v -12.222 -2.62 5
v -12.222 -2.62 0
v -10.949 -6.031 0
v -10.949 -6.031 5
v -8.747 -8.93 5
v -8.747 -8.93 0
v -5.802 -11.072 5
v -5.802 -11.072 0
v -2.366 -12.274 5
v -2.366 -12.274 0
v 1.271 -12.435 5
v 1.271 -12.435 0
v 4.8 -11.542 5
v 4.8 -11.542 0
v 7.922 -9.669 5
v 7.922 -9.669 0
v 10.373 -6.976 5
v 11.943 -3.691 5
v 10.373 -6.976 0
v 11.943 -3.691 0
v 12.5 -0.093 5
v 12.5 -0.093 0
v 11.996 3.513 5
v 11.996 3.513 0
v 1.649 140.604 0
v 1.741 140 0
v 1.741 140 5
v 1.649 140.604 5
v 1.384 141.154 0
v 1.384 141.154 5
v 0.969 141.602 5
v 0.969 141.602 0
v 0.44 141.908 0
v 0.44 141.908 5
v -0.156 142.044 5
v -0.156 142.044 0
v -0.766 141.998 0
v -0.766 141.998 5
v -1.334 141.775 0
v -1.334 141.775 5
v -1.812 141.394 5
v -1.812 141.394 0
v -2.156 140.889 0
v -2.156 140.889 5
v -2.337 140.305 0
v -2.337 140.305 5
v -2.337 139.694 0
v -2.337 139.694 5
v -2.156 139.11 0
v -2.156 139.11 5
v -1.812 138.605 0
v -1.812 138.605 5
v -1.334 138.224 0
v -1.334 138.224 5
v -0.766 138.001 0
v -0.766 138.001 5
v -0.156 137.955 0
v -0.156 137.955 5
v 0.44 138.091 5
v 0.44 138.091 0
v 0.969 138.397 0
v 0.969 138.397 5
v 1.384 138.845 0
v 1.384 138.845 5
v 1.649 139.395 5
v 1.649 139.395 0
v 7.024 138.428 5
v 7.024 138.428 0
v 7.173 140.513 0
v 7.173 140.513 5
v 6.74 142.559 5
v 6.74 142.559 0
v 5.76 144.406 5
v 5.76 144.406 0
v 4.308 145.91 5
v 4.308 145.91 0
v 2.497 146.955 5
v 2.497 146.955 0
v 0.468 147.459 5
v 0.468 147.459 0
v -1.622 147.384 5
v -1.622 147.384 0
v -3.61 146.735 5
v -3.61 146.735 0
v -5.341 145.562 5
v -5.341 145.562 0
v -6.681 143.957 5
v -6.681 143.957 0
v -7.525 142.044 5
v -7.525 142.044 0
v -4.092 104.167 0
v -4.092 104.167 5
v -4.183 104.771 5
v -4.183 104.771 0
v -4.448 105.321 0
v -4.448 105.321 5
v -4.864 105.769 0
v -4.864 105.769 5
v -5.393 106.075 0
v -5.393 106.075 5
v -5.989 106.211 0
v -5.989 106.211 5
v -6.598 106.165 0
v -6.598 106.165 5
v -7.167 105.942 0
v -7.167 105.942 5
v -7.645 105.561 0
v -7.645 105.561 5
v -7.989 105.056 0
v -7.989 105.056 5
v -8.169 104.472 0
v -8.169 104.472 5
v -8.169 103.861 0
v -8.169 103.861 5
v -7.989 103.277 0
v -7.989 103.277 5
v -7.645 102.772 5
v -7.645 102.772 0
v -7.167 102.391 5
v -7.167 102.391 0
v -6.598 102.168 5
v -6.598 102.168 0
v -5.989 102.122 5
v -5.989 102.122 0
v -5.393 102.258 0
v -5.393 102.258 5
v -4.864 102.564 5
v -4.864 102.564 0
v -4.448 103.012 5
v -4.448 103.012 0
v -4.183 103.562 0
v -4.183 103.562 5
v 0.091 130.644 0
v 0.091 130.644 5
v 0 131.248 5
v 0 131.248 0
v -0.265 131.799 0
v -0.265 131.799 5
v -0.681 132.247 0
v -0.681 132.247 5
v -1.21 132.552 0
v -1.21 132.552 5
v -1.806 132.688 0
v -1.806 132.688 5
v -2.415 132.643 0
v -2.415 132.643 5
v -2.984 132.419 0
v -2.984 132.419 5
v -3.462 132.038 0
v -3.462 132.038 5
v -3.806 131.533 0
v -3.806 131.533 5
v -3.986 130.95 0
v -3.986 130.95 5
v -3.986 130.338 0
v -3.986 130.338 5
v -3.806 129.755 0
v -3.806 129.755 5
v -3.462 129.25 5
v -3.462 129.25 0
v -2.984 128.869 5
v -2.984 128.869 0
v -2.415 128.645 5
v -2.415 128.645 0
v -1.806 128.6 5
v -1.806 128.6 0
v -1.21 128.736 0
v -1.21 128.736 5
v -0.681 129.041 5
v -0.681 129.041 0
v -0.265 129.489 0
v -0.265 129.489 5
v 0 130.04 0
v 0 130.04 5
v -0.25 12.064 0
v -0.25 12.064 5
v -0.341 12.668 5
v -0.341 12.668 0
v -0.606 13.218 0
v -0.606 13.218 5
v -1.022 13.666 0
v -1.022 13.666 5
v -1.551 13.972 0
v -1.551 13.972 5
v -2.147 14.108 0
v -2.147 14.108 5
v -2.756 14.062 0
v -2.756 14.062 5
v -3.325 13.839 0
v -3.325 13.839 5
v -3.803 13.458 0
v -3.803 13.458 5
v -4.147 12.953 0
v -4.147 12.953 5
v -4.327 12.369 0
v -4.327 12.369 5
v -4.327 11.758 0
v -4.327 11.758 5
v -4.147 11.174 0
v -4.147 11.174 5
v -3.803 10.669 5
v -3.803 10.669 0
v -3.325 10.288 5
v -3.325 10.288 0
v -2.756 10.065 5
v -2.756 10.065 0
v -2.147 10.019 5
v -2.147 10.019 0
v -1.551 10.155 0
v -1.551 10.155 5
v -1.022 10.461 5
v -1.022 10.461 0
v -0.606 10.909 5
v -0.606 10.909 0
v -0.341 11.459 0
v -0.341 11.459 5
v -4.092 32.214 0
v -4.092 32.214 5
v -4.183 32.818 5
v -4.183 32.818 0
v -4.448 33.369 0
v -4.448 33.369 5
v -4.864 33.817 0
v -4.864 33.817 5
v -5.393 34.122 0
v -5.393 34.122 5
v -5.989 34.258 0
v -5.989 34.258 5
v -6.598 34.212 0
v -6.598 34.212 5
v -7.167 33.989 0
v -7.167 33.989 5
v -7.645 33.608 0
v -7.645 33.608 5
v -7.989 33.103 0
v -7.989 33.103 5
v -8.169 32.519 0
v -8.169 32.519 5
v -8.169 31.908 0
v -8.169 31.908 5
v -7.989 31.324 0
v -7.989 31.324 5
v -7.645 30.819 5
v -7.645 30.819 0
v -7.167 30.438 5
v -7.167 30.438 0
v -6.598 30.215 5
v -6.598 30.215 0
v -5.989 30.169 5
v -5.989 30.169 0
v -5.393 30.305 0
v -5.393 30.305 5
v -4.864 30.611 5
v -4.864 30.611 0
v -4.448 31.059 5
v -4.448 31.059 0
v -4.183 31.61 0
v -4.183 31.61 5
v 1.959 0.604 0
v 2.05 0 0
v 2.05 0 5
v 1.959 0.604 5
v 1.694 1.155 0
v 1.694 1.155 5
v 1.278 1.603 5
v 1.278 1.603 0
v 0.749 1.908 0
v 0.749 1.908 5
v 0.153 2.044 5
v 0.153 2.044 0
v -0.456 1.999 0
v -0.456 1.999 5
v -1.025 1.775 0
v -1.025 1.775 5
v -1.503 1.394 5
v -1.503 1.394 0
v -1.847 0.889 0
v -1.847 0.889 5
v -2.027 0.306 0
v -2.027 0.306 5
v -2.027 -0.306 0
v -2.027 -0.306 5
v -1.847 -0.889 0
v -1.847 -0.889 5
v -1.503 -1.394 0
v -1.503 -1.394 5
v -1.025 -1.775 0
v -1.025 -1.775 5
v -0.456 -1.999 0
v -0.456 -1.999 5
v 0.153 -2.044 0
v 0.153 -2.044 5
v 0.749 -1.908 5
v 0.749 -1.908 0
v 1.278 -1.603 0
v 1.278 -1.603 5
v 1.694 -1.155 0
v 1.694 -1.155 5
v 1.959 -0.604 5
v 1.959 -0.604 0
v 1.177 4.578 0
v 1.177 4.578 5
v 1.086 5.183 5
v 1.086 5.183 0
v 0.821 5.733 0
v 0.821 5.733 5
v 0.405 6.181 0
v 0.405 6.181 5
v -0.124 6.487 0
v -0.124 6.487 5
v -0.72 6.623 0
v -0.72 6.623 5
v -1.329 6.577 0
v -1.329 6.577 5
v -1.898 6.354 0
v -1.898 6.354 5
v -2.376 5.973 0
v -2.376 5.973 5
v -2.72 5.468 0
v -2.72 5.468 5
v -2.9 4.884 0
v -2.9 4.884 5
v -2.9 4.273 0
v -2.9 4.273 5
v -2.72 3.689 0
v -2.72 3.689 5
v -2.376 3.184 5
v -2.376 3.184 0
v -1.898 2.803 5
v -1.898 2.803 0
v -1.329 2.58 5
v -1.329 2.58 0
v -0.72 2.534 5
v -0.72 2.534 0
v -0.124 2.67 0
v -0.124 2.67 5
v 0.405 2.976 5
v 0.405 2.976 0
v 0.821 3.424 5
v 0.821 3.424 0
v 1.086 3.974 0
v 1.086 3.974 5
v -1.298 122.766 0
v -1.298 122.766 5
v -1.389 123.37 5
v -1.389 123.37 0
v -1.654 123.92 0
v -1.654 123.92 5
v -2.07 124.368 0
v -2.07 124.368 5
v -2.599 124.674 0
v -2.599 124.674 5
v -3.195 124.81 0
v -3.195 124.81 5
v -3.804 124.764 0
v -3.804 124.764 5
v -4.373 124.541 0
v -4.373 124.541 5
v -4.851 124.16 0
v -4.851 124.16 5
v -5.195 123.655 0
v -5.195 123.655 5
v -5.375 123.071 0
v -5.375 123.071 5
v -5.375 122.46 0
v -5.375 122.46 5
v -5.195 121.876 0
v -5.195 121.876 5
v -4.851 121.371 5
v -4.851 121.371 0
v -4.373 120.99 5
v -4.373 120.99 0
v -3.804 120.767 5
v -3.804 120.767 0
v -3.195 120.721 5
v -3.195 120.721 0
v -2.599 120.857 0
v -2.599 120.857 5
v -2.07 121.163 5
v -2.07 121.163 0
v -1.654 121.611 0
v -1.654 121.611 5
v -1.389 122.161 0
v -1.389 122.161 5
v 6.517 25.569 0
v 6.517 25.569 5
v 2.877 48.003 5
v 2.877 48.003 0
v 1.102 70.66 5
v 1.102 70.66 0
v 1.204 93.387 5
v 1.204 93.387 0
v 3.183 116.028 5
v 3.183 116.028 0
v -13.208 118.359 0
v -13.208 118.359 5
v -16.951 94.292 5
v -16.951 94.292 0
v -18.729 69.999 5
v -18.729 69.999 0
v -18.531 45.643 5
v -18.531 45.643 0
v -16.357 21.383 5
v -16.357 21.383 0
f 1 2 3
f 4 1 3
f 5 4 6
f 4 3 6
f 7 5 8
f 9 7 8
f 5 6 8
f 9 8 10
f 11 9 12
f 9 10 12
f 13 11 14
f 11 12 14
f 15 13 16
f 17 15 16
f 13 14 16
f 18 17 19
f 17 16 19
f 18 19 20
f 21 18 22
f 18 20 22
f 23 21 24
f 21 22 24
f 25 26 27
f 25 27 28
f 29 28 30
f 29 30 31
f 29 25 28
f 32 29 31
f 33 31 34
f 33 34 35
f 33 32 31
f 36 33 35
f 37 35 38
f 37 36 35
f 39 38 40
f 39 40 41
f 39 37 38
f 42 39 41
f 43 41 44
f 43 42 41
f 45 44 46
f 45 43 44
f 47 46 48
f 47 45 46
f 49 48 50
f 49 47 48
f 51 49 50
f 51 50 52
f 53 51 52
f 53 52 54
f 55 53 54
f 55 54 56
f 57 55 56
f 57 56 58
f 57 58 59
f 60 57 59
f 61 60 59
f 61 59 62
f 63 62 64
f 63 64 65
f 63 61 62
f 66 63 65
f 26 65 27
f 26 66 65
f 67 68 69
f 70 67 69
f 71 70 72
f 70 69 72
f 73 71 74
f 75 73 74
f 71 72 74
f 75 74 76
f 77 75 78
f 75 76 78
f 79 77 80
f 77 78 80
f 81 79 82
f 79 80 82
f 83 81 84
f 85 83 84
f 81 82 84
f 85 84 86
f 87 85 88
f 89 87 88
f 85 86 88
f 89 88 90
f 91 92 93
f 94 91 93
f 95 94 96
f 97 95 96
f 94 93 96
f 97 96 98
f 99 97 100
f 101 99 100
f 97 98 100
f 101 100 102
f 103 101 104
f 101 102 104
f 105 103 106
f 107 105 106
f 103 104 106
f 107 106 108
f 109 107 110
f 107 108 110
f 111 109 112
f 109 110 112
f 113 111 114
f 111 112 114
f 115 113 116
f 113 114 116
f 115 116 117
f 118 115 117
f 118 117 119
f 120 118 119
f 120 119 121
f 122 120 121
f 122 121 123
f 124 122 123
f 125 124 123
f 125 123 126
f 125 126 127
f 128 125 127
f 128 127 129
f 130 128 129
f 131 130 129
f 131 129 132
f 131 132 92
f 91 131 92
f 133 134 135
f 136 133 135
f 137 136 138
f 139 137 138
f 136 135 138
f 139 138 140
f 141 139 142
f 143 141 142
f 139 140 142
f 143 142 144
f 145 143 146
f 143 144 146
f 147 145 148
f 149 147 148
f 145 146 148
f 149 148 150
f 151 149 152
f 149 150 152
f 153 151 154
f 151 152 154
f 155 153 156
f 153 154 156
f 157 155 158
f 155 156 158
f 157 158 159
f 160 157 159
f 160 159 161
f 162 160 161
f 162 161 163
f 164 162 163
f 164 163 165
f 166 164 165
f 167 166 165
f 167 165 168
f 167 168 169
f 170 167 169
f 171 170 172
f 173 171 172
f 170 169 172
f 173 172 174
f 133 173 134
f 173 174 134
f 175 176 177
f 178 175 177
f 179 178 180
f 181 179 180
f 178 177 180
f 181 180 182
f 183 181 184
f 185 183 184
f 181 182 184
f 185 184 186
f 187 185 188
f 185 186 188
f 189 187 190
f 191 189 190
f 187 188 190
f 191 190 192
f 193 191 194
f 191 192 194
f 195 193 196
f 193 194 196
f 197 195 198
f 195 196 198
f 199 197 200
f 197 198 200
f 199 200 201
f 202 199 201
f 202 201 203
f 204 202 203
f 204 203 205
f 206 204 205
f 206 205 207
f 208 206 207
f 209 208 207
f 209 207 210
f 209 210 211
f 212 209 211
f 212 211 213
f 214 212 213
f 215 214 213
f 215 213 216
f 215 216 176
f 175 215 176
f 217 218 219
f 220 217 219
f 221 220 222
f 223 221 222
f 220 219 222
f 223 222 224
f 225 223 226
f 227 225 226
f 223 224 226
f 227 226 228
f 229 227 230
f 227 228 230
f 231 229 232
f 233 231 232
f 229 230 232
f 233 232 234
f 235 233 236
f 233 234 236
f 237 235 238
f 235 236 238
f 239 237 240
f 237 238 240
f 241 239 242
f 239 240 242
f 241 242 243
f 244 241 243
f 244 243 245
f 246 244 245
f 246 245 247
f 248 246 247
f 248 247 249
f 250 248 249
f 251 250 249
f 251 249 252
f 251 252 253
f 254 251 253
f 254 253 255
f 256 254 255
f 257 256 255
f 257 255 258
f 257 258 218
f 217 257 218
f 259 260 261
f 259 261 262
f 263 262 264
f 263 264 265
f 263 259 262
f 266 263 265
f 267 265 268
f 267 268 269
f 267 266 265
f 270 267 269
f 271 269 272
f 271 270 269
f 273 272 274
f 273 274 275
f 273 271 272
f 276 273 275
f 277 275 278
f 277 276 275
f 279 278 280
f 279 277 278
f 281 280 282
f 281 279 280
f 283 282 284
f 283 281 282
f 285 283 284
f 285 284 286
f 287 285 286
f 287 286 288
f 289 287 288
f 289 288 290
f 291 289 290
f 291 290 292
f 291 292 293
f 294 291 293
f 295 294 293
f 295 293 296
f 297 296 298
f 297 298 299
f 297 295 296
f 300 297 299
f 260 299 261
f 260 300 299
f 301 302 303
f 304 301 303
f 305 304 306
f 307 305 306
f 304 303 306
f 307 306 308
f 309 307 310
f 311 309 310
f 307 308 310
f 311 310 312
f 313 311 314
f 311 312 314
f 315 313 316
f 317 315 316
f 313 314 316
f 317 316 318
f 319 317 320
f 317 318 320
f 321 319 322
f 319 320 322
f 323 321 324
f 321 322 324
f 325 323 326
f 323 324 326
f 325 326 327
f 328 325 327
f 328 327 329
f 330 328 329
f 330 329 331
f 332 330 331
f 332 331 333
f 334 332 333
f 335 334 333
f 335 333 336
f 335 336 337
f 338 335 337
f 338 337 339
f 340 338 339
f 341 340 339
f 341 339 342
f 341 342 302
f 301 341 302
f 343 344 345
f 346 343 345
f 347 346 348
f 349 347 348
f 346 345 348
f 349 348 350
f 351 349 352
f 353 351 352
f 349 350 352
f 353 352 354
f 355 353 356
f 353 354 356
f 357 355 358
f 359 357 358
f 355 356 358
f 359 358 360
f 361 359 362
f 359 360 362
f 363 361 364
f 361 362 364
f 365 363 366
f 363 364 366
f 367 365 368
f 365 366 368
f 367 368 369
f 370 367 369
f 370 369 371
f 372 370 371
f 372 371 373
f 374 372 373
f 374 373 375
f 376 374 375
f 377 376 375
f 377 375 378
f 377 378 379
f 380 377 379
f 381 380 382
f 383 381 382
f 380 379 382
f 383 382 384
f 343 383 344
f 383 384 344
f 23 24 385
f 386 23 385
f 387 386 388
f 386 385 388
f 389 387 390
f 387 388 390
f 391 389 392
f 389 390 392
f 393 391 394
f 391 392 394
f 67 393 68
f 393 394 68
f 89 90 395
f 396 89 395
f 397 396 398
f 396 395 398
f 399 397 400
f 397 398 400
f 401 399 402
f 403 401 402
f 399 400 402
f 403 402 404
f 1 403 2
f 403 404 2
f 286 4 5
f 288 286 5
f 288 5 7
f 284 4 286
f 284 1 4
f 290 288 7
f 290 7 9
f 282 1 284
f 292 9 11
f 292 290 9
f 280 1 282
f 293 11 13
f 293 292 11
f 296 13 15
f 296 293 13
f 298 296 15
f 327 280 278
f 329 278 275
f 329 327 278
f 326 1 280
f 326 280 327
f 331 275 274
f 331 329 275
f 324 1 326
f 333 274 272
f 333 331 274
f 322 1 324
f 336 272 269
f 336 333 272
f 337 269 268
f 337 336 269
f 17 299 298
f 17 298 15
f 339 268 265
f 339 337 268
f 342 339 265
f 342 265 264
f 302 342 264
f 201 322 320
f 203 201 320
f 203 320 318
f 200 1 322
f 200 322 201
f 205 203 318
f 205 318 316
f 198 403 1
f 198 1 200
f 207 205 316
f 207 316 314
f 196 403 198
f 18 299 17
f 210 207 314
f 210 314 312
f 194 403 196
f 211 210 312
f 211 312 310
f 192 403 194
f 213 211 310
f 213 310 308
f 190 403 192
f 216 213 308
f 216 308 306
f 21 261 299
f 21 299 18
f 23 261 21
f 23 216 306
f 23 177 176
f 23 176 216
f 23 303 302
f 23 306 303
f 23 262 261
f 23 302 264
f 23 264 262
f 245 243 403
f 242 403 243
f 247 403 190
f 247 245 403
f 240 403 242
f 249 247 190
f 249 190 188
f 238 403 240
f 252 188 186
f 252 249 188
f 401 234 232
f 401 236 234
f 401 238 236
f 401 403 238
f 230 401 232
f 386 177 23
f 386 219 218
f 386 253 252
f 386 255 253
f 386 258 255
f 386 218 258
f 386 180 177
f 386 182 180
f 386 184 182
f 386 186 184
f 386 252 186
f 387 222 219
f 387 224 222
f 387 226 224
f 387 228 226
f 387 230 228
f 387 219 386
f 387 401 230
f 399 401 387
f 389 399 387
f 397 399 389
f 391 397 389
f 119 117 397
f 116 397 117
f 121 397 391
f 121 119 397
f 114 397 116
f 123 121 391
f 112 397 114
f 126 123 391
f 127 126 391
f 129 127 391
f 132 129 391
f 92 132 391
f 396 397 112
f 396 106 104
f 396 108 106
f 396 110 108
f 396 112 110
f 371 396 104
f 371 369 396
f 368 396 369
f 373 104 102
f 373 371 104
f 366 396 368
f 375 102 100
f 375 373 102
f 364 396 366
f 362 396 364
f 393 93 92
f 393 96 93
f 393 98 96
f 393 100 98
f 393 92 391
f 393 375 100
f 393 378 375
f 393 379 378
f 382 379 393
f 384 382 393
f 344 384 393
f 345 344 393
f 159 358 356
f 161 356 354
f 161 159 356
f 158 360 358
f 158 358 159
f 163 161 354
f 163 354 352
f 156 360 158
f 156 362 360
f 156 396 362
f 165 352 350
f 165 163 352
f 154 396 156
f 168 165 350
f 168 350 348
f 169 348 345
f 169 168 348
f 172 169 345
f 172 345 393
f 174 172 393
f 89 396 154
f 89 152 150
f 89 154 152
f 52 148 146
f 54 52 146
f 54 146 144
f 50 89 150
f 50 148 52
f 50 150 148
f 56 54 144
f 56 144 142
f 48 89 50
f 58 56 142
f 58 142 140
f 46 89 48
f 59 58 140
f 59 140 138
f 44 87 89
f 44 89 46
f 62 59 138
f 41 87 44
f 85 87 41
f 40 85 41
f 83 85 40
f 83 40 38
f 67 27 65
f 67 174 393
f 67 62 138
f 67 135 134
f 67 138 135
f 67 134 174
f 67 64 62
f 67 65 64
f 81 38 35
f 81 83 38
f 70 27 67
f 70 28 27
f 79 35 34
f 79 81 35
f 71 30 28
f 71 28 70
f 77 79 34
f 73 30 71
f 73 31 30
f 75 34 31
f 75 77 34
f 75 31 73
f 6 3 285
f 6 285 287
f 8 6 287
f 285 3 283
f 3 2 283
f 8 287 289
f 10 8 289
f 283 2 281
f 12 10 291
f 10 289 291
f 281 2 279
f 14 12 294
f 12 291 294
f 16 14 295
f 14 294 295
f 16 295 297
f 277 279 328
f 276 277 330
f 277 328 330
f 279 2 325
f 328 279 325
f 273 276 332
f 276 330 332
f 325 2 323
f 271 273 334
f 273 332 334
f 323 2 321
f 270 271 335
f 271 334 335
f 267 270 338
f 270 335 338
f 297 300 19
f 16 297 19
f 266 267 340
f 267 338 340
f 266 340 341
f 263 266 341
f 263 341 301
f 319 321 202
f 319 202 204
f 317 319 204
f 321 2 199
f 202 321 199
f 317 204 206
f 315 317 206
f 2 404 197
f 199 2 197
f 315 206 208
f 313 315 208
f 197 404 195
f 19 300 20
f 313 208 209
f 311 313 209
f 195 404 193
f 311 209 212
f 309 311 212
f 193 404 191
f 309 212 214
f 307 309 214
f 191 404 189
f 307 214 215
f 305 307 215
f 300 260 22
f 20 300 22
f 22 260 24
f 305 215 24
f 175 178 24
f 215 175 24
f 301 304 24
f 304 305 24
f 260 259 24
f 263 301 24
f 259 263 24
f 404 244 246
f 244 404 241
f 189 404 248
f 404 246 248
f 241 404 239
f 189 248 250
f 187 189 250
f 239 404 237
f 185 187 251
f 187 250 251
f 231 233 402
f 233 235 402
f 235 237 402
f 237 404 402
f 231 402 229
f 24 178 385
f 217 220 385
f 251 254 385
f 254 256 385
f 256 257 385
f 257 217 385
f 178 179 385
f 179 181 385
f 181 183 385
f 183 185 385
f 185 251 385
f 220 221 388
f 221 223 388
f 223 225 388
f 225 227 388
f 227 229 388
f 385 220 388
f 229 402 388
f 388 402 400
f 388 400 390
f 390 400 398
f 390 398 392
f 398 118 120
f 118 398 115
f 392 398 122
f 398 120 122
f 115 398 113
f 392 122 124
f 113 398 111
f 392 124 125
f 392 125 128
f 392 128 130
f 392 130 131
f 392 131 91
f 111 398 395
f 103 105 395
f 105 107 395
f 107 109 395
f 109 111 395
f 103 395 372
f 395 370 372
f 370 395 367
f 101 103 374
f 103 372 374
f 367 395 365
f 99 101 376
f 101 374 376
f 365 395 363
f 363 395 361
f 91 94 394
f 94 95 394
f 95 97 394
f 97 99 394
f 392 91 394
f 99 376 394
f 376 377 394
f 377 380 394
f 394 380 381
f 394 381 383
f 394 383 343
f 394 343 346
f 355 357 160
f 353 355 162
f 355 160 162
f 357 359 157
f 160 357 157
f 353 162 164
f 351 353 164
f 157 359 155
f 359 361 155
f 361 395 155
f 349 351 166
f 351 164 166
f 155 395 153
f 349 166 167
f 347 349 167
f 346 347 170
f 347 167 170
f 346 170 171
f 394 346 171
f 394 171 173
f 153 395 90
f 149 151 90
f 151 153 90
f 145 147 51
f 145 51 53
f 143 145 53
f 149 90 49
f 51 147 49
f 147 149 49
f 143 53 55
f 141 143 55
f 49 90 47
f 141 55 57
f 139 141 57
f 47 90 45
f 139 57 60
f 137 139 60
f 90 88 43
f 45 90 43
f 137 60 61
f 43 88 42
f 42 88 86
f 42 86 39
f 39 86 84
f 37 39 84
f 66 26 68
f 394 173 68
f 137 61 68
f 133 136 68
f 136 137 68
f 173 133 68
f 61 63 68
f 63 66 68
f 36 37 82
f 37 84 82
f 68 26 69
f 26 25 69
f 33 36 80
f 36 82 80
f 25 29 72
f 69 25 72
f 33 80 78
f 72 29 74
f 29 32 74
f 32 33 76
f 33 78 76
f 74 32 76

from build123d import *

# Parameters (mm, degrees)
SCHIZZO1_R                   = 2.05
ESTRUSIONE_ESTRUSIONE1_DEPTH = 5
TAGLIO_ESTRUSIONE1_REACH     = 7
SCHIZZO2_R                   = 2.05
SKETCH1_R                    = 2.05
CUT_EXTRUDE1_DEPTH           = 5
CUT_EXTRUDE2_REACH           = 7
SKETCH2_R                    = 2.05


with BuildPart() as part:
    # Schizzo1 → Estrusione-Estrusione1 (new body)
    with BuildSketch(Plane.XY):
        with BuildLine():
            ThreePointArc((7.023974797, 138.427683332), (1.499753731, 147.278176914), (-7.525391936, 142.044153534))
            ThreePointArc((-7.525391936, 142.044153534), (-18.729107246, 69.99949188), (-12.22229981, -2.620188418))
            ThreePointArc((-12.22229981, -2.620188418), (3.068449146, -12.117533571), (11.996332959, 3.512548298))
            ThreePointArc((11.996332959, 3.512548298), (1.102237583, 70.660238267), (7.023974797, 138.427683332))
        make_face()
        Circle(SCHIZZO1_R, mode=Mode.SUBTRACT)
        with Locations((-0.309434746, 139.999658036)):
            Circle(SCHIZZO1_R, mode=Mode.SUBTRACT)
    extrude(amount=ESTRUSIONE_ESTRUSIONE1_DEPTH)

    # Schizzo2 → Taglio-Estrusione1 (cut, up to next)
    with BuildSketch(Plane.XY.offset(5), mode=Mode.PRIVATE) as taglio_estrusione1_sk1:
        with Locations((-6.142115432, 104.166670735)):
            Circle(SCHIZZO2_R)
    taglio_estrusione1_tool1 = extrude(taglio_estrusione1_sk1.sketch, amount=-TAGLIO_ESTRUSIONE1_REACH, mode=Mode.PRIVATE) & part.part
    add(taglio_estrusione1_tool1.solids().sort_by_distance((-6.142115, 104.166671, 5))[0], mode=Mode.SUBTRACT)
    # Schizzo2 → Taglio-Estrusione1 (cut, up to next)
    with BuildSketch(Plane.XY.offset(5), mode=Mode.PRIVATE) as taglio_estrusione1_sk2:
        with Locations((-6.142115432, 32.213749463)):
            Circle(SCHIZZO2_R)
    taglio_estrusione1_tool2 = extrude(taglio_estrusione1_sk2.sketch, amount=-TAGLIO_ESTRUSIONE1_REACH, mode=Mode.PRIVATE) & part.part
    add(taglio_estrusione1_tool2.solids().sort_by_distance((-6.142115, 32.213749, 5))[0], mode=Mode.SUBTRACT)

    # Sketch1 → Cut-Extrude1 (cut)
    with BuildSketch(Plane.XY.offset(5)):
        with Locations((-0.309434746, 139.999658036)):
            Circle(SKETCH1_R)
        with Locations((-1.959092434, 130.643984382)):
            Circle(SKETCH1_R)
        with Locations((-3.348277855, 122.765522358)):
            Circle(SKETCH1_R)
    extrude(amount=-CUT_EXTRUDE1_DEPTH, mode=Mode.SUBTRACT)

    # Sketch2 → Cut-Extrude2 (cut, up to next)
    with BuildSketch(Plane.XY.offset(5), mode=Mode.PRIVATE) as cut_extrude2_sk1:
        with Locations((-0.872956087, 4.578420741)):
            Circle(SKETCH2_R)
    cut_extrude2_tool1 = extrude(cut_extrude2_sk1.sketch, amount=-CUT_EXTRUDE2_REACH, mode=Mode.PRIVATE) & part.part
    add(cut_extrude2_tool1.solids().sort_by_distance((-0.872956, 4.578421, 5))[0], mode=Mode.SUBTRACT)
    # Sketch2 → Cut-Extrude2 (cut, up to next)
    with BuildSketch(Plane.XY.offset(5), mode=Mode.PRIVATE) as cut_extrude2_sk2:
        with Locations((-2.300132251, 12.063577265)):
            Circle(SKETCH2_R)
    cut_extrude2_tool2 = extrude(cut_extrude2_sk2.sketch, amount=-CUT_EXTRUDE2_REACH, mode=Mode.PRIVATE) & part.part
    add(cut_extrude2_tool2.solids().sort_by_distance((-2.300132, 12.063577, 5))[0], mode=Mode.SUBTRACT)


solid = part.part
